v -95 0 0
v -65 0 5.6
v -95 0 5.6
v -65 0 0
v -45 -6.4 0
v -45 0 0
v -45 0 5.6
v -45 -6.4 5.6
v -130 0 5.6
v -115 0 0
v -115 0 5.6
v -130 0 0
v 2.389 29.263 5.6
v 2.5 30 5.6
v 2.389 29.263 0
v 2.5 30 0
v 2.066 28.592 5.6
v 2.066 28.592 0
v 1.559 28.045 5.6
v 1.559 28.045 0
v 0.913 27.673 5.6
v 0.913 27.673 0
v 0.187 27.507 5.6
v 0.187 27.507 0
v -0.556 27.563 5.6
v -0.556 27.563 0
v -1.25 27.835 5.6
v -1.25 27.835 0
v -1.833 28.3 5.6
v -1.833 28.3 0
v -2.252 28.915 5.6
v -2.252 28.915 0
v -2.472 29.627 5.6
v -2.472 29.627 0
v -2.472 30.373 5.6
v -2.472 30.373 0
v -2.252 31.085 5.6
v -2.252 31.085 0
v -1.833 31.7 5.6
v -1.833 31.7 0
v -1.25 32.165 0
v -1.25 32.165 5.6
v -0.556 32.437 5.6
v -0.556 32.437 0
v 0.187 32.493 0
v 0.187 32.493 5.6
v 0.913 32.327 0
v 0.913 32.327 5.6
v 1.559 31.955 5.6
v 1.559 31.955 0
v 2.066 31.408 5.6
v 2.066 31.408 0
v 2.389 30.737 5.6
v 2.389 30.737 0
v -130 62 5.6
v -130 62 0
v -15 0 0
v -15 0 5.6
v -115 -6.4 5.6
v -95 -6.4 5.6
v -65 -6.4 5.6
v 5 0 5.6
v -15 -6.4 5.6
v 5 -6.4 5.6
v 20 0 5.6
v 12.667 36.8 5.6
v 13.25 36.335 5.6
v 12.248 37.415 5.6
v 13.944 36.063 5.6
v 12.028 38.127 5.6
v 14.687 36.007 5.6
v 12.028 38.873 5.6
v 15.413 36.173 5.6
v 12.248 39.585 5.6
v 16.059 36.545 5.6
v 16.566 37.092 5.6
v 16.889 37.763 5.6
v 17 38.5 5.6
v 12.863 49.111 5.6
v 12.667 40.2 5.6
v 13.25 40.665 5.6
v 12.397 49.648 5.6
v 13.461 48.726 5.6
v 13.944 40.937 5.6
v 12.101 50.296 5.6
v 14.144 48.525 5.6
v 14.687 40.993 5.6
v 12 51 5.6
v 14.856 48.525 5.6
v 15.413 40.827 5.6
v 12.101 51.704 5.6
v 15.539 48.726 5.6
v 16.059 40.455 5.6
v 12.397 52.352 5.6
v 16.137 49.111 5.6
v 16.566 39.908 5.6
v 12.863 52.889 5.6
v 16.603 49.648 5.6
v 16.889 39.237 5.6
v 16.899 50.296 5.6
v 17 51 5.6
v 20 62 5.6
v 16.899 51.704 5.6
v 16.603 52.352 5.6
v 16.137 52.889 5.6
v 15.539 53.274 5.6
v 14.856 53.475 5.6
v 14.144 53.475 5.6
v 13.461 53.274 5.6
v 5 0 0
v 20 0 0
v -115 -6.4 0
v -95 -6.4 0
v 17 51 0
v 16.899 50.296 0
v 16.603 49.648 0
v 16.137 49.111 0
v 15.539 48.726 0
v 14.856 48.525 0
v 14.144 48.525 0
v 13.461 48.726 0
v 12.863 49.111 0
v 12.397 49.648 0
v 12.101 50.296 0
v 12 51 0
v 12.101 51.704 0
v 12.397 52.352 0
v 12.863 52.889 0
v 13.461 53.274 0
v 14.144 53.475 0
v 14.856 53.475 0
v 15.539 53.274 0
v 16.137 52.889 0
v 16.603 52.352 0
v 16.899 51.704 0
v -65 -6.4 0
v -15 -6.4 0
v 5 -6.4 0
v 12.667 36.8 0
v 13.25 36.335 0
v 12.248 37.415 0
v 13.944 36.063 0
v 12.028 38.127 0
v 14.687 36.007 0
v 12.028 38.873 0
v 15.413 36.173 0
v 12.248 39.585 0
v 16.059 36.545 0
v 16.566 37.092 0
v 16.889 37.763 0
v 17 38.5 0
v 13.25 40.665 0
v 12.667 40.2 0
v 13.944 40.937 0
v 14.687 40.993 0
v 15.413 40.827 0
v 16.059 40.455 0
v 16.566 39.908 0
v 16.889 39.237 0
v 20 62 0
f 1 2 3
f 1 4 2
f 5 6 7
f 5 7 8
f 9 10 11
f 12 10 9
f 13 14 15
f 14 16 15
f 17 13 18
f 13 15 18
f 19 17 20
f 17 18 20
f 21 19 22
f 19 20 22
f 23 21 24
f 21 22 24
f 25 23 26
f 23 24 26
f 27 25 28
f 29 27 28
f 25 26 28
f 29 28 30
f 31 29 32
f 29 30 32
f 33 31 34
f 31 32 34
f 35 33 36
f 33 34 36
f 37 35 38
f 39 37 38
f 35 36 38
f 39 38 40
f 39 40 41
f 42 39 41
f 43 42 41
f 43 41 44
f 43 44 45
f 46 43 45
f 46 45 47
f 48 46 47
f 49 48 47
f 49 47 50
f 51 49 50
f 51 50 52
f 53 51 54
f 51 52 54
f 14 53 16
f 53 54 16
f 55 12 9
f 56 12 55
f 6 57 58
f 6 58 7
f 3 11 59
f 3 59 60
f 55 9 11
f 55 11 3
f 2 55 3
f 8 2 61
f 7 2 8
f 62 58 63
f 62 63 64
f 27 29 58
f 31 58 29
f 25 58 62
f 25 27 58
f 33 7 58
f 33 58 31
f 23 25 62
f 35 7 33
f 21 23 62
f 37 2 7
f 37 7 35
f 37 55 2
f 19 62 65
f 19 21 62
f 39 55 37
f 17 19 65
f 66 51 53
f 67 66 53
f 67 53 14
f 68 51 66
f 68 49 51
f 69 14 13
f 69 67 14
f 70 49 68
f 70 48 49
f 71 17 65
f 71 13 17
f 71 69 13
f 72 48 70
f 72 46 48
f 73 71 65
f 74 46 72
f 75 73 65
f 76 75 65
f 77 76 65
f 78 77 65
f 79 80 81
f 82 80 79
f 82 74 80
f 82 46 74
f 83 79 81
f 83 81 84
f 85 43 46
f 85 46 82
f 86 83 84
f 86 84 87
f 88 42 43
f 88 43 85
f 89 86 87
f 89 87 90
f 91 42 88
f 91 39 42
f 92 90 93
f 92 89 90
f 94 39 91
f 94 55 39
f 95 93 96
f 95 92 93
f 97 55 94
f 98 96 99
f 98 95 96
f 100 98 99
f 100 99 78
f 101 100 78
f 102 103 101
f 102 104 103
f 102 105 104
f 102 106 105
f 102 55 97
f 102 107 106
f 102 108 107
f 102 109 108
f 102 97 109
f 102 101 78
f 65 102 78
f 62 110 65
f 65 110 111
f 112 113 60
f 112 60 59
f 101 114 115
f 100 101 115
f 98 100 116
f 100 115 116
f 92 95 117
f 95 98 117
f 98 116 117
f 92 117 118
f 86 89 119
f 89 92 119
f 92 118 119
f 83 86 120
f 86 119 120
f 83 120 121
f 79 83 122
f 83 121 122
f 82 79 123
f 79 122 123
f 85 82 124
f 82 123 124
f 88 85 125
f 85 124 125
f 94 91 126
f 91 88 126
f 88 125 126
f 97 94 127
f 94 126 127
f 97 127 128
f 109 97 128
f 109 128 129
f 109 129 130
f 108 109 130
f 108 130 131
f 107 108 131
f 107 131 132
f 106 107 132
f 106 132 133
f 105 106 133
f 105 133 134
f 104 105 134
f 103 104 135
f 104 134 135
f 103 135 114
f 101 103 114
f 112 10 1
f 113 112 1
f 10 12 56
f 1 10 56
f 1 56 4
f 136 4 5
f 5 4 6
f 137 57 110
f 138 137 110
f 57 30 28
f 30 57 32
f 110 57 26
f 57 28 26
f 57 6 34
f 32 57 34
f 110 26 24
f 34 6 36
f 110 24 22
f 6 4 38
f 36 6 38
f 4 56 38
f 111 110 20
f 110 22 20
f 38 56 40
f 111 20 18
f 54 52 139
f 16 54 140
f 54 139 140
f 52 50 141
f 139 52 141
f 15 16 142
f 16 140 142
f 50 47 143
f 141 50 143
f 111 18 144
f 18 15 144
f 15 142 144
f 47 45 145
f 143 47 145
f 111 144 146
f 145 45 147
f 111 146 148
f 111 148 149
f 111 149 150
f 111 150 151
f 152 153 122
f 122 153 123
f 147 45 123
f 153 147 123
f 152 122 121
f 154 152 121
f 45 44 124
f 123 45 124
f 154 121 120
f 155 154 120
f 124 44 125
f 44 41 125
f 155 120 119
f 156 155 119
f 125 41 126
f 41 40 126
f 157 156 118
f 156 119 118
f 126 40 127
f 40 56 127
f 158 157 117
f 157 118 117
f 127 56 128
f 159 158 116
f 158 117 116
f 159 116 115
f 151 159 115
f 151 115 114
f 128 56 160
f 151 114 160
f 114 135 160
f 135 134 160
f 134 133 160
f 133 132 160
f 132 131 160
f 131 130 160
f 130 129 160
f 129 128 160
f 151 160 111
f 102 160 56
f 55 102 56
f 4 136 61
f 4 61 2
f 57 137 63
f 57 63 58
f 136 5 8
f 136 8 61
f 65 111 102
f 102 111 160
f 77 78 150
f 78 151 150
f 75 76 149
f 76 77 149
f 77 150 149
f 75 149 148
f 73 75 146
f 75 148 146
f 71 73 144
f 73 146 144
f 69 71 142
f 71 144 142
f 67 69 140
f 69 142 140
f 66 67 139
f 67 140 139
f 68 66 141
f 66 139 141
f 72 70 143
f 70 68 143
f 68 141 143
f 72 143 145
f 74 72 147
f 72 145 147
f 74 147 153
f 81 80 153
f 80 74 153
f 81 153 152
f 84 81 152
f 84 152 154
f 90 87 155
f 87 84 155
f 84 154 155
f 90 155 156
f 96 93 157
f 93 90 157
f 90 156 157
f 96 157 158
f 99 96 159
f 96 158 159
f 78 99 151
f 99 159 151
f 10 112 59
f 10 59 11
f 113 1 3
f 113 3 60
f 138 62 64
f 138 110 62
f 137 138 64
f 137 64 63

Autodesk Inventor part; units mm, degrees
ref_plane "YZ Plane" through (0, 0, 0) normal (1, 0, 0) x (0, 1, 0)
ref_plane "XZ Plane" through (0, 0, 0) normal (0, 1, 0) x (-1, 0, 0)
ref_plane "XY Plane" through (0, 0, 0) normal (0, 0, 1) x (1, 0, 0)
sketch "Sketch1" plane through (0, 0, 0) normal (0, 0, 1) x (1, 0, 0)
  line L0 (0, 0) -> (-130, 0)
  line L1 (-130, 0) -> (-130, 62)
  line L2 (-130, 62) -> (0, 62)
  line L3 (0, 62) -> (0, 32.5)
  line L4 (0, 0) -> (20, 0)
  line L5 (20, 0) -> (20, 62)
  line L6 (20, 62) -> (0, 62)
  line L7 (0, 62) -> (0, 0)
  circle A0 centre (0, 30) radius 2.5
  circle A1 centre (14.5, 38.5) radius 2.5
  circle A2 centre (14.5, 51) radius 2.5
  line L8 (14.5, 51) -> (-130, 51)
  line L9 (-115, 0) -> (-95, 0)
  line L10 (-95, 0) -> (-95, -6.4)
  line L11 (-95, -6.4) -> (-115, -6.4)
  line L12 (-115, -6.4) -> (-115, 0)
  line L13 (-65, 0) -> (-45, 0)
  line L14 (-45, 0) -> (-45, -6.4)
  line L15 (-45, -6.4) -> (-65, -6.4)
  line L16 (-65, -6.4) -> (-65, 0)
  line L17 (-15, 0) -> (5, 0)
  line L18 (5, 0) -> (5, -6.4)
  line L19 (5, -6.4) -> (-15, -6.4)
  line L20 (-15, -6.4) -> (-15, 0)
  line L21 (-55, 62) -> (-55, 0)
  line L22 (0, 32.5) -> (0, 27.5)
  line L23 (0, 27.5) -> (0, 0)
  dimension "d0" = 20
  dimension "d1" = 150
  dimension "d2" = 62
  dimension "d3" = 5
  dimension "d4" = 5
  dimension "d5" = 5
  dimension "d6" = 30
  dimension "d7" = 14.5
  dimension "d8" = 8.5
  dimension "d9" = 12.5
  dimension "d10" = 0
  dimension "d11" = 20
  dimension "d12" = 6.4
  dimension "d15" = 50
  dimension "d20" = 75
extrude "Extrusion1" add sketch "Sketch1" along normal blind 5.6 contours L4 L18 L19 L20 L0 | L7 A0 L3 L6 L5 L4 | L0 L21 L8 L3 A0 L7 | L14 L15 L16 L0 | L0 L1 L8 L21 | L8 L21 L2 L3 | L8 L1 L2 L21 | L10 L11 L12 L0
sketch "Sketch3" plane through (0, 0, 5.6) normal (0, 0, 1) x (1, 0, 0)
  circle A0 centre (14.5, 51) radius 2.5 projected
  circle A1 centre (14.5, 38.5) radius 2.5 projected
  circle A2 centre (0, 30) radius 2.5 projected
  line L0 (-115, 0) -> (-115, -6.4) projected
  line L1 (-115, -6.4) -> (-95, -6.4) projected
  line L2 (-95, -6.4) -> (-95, 0) projected
  line L3 (-95, 0) -> (-65, 0) projected
  line L4 (-65, 0) -> (-65, -6.4) projected
  line L5 (-65, -6.4) -> (-45, -6.4) projected
  line L6 (-45, -6.4) -> (-45, 0) projected
  line L7 (-45, 0) -> (-15, 0) projected
  line L8 (-15, 0) -> (-15, -6.4) projected
  line L9 (-15, -6.4) -> (5, -6.4) projected
  line L10 (5, -6.4) -> (5, 0) projected
  line L11 (5, 0) -> (20, 0) projected
  line L12 (20, 0) -> (20, 62) projected
  line L13 (20, 62) -> (-130, 62) projected
  line L14 (-130, 62) -> (-130, 0) projected
  line L15 (-130, 0) -> (-115, 0) projected
  line L16 (-110, 62) -> (-104.4, 62)
  line L17 (-104.4, 62) -> (-104.4, 32)
  line L18 (-104.4, 32) -> (-110, 32)
  line L19 (-110, 32) -> (-110, 62)
  point P0 (0, 0)
  dimension "d33" = 5.6
  dimension "d34" = 20
  dimension "d35" = 30
sketch "Sketch2" plane through (0, 0, 5.6) normal (0, 0, 1) x (1, 0, 0)
  circle A0 centre (14.5, 51) radius 2.5 projected
  line L0 (20, 62) -> (-130, 62) projected
  line L1 (-130, 62) -> (-130, 0) projected
  line L2 (-110, 62) -> (-104.4, 62)
  line L3 (-104.4, 62) -> (-104.4, 51)
  line L4 (-104.4, 51) -> (-110, 51)
  line L5 (-110, 51) -> (-110, 62)
  circle A1 centre (-107.2, 41) radius 1.65
  line L6 (-107.2, 62) -> (-107.2, 51)
  arc A2 (-109.5, 51) -> (-110, 51.5) centre (-110, 51) ccw
  arc A3 (-104.4, 51.5) -> (-104.9, 51) centre (-104.4, 51) ccw
  arc A4 (-104.9, 51) -> (-104.4, 51.5) centre (-104.4, 51) ccw
  arc A5 (-110, 51.5) -> (-109.5, 51) centre (-110, 51) ccw
  point P0 (0, 0)
  dimension "d23" = 5.6
  dimension "d24" = 20
  dimension "d25" = 0
  dimension "d26" = 3.3
  dimension "d27" = 0
  dimension "d28" = 10
  dimension "d31" = 1
  dimension "d32" = 1
equation "\"d1\" = subframe_x"
equation "\"d2\" = subframe_z"
equation "\"d12\" = wood_thickness"
equation "\"d15\" = 0.333333 * subframe_x"
equation "\"d20\" = 0.5 * subframe_x"
equation "\"t_subframe\" = thick_acrylic"
equation "\"d33\" = t_subframe"
equation "\"d23\" = t_subframe"
equation "\"wood_thickness\" = 6.4"
equation "\"m3_diameter\" = 3.15"
equation "\"m5_diameter\" = 5.25"
equation "\"stepper_screw_space\" = 35"
equation "\"stepper_shaft_diameter\" = 5"
equation "\"stepper_body_diameter\" = 28"
equation "\"laser_body_diameter\" = 12"
equation "\"thick_acrylic\" = 5.6"
equation "\"carrier_z\" = 258.6"
equation "\"carrier_z2\" = 283.6"
equation "\"thin_acrylic\" = 3"
equation "\"clear_acrylic\" = 2"
equation "\"linear_bearing_spacing\" = 216"
equation "\"linear_bearing_z\" = 304.8"
equation "\"threaded_rod_z\" = 203.2"
equation "\"motor_spacing\" = 296"
equation "\"tray_boarder\" = 15"
equation "\"bed_clamp_border\" = 15"
equation "\"brass_insert_drill\" = 4"
equation "\"brass_keep_out\" = 8"
equation "\"tape_keep_out\" = 2"
equation "\"tape_thickness\" = 2"
equation "\"crane_x\" = 245.2"
equation "\"crane_z\" = 25"
equation "\"z_min_from_center\" = 72.6"
equation "\"frame_tilt\" = 1deg"
equation "\"printer_z\" = 289"
equation "\"subframe_x\" = 150"
equation "\"subframe_z\" = 62"
properties part number "subframe"
